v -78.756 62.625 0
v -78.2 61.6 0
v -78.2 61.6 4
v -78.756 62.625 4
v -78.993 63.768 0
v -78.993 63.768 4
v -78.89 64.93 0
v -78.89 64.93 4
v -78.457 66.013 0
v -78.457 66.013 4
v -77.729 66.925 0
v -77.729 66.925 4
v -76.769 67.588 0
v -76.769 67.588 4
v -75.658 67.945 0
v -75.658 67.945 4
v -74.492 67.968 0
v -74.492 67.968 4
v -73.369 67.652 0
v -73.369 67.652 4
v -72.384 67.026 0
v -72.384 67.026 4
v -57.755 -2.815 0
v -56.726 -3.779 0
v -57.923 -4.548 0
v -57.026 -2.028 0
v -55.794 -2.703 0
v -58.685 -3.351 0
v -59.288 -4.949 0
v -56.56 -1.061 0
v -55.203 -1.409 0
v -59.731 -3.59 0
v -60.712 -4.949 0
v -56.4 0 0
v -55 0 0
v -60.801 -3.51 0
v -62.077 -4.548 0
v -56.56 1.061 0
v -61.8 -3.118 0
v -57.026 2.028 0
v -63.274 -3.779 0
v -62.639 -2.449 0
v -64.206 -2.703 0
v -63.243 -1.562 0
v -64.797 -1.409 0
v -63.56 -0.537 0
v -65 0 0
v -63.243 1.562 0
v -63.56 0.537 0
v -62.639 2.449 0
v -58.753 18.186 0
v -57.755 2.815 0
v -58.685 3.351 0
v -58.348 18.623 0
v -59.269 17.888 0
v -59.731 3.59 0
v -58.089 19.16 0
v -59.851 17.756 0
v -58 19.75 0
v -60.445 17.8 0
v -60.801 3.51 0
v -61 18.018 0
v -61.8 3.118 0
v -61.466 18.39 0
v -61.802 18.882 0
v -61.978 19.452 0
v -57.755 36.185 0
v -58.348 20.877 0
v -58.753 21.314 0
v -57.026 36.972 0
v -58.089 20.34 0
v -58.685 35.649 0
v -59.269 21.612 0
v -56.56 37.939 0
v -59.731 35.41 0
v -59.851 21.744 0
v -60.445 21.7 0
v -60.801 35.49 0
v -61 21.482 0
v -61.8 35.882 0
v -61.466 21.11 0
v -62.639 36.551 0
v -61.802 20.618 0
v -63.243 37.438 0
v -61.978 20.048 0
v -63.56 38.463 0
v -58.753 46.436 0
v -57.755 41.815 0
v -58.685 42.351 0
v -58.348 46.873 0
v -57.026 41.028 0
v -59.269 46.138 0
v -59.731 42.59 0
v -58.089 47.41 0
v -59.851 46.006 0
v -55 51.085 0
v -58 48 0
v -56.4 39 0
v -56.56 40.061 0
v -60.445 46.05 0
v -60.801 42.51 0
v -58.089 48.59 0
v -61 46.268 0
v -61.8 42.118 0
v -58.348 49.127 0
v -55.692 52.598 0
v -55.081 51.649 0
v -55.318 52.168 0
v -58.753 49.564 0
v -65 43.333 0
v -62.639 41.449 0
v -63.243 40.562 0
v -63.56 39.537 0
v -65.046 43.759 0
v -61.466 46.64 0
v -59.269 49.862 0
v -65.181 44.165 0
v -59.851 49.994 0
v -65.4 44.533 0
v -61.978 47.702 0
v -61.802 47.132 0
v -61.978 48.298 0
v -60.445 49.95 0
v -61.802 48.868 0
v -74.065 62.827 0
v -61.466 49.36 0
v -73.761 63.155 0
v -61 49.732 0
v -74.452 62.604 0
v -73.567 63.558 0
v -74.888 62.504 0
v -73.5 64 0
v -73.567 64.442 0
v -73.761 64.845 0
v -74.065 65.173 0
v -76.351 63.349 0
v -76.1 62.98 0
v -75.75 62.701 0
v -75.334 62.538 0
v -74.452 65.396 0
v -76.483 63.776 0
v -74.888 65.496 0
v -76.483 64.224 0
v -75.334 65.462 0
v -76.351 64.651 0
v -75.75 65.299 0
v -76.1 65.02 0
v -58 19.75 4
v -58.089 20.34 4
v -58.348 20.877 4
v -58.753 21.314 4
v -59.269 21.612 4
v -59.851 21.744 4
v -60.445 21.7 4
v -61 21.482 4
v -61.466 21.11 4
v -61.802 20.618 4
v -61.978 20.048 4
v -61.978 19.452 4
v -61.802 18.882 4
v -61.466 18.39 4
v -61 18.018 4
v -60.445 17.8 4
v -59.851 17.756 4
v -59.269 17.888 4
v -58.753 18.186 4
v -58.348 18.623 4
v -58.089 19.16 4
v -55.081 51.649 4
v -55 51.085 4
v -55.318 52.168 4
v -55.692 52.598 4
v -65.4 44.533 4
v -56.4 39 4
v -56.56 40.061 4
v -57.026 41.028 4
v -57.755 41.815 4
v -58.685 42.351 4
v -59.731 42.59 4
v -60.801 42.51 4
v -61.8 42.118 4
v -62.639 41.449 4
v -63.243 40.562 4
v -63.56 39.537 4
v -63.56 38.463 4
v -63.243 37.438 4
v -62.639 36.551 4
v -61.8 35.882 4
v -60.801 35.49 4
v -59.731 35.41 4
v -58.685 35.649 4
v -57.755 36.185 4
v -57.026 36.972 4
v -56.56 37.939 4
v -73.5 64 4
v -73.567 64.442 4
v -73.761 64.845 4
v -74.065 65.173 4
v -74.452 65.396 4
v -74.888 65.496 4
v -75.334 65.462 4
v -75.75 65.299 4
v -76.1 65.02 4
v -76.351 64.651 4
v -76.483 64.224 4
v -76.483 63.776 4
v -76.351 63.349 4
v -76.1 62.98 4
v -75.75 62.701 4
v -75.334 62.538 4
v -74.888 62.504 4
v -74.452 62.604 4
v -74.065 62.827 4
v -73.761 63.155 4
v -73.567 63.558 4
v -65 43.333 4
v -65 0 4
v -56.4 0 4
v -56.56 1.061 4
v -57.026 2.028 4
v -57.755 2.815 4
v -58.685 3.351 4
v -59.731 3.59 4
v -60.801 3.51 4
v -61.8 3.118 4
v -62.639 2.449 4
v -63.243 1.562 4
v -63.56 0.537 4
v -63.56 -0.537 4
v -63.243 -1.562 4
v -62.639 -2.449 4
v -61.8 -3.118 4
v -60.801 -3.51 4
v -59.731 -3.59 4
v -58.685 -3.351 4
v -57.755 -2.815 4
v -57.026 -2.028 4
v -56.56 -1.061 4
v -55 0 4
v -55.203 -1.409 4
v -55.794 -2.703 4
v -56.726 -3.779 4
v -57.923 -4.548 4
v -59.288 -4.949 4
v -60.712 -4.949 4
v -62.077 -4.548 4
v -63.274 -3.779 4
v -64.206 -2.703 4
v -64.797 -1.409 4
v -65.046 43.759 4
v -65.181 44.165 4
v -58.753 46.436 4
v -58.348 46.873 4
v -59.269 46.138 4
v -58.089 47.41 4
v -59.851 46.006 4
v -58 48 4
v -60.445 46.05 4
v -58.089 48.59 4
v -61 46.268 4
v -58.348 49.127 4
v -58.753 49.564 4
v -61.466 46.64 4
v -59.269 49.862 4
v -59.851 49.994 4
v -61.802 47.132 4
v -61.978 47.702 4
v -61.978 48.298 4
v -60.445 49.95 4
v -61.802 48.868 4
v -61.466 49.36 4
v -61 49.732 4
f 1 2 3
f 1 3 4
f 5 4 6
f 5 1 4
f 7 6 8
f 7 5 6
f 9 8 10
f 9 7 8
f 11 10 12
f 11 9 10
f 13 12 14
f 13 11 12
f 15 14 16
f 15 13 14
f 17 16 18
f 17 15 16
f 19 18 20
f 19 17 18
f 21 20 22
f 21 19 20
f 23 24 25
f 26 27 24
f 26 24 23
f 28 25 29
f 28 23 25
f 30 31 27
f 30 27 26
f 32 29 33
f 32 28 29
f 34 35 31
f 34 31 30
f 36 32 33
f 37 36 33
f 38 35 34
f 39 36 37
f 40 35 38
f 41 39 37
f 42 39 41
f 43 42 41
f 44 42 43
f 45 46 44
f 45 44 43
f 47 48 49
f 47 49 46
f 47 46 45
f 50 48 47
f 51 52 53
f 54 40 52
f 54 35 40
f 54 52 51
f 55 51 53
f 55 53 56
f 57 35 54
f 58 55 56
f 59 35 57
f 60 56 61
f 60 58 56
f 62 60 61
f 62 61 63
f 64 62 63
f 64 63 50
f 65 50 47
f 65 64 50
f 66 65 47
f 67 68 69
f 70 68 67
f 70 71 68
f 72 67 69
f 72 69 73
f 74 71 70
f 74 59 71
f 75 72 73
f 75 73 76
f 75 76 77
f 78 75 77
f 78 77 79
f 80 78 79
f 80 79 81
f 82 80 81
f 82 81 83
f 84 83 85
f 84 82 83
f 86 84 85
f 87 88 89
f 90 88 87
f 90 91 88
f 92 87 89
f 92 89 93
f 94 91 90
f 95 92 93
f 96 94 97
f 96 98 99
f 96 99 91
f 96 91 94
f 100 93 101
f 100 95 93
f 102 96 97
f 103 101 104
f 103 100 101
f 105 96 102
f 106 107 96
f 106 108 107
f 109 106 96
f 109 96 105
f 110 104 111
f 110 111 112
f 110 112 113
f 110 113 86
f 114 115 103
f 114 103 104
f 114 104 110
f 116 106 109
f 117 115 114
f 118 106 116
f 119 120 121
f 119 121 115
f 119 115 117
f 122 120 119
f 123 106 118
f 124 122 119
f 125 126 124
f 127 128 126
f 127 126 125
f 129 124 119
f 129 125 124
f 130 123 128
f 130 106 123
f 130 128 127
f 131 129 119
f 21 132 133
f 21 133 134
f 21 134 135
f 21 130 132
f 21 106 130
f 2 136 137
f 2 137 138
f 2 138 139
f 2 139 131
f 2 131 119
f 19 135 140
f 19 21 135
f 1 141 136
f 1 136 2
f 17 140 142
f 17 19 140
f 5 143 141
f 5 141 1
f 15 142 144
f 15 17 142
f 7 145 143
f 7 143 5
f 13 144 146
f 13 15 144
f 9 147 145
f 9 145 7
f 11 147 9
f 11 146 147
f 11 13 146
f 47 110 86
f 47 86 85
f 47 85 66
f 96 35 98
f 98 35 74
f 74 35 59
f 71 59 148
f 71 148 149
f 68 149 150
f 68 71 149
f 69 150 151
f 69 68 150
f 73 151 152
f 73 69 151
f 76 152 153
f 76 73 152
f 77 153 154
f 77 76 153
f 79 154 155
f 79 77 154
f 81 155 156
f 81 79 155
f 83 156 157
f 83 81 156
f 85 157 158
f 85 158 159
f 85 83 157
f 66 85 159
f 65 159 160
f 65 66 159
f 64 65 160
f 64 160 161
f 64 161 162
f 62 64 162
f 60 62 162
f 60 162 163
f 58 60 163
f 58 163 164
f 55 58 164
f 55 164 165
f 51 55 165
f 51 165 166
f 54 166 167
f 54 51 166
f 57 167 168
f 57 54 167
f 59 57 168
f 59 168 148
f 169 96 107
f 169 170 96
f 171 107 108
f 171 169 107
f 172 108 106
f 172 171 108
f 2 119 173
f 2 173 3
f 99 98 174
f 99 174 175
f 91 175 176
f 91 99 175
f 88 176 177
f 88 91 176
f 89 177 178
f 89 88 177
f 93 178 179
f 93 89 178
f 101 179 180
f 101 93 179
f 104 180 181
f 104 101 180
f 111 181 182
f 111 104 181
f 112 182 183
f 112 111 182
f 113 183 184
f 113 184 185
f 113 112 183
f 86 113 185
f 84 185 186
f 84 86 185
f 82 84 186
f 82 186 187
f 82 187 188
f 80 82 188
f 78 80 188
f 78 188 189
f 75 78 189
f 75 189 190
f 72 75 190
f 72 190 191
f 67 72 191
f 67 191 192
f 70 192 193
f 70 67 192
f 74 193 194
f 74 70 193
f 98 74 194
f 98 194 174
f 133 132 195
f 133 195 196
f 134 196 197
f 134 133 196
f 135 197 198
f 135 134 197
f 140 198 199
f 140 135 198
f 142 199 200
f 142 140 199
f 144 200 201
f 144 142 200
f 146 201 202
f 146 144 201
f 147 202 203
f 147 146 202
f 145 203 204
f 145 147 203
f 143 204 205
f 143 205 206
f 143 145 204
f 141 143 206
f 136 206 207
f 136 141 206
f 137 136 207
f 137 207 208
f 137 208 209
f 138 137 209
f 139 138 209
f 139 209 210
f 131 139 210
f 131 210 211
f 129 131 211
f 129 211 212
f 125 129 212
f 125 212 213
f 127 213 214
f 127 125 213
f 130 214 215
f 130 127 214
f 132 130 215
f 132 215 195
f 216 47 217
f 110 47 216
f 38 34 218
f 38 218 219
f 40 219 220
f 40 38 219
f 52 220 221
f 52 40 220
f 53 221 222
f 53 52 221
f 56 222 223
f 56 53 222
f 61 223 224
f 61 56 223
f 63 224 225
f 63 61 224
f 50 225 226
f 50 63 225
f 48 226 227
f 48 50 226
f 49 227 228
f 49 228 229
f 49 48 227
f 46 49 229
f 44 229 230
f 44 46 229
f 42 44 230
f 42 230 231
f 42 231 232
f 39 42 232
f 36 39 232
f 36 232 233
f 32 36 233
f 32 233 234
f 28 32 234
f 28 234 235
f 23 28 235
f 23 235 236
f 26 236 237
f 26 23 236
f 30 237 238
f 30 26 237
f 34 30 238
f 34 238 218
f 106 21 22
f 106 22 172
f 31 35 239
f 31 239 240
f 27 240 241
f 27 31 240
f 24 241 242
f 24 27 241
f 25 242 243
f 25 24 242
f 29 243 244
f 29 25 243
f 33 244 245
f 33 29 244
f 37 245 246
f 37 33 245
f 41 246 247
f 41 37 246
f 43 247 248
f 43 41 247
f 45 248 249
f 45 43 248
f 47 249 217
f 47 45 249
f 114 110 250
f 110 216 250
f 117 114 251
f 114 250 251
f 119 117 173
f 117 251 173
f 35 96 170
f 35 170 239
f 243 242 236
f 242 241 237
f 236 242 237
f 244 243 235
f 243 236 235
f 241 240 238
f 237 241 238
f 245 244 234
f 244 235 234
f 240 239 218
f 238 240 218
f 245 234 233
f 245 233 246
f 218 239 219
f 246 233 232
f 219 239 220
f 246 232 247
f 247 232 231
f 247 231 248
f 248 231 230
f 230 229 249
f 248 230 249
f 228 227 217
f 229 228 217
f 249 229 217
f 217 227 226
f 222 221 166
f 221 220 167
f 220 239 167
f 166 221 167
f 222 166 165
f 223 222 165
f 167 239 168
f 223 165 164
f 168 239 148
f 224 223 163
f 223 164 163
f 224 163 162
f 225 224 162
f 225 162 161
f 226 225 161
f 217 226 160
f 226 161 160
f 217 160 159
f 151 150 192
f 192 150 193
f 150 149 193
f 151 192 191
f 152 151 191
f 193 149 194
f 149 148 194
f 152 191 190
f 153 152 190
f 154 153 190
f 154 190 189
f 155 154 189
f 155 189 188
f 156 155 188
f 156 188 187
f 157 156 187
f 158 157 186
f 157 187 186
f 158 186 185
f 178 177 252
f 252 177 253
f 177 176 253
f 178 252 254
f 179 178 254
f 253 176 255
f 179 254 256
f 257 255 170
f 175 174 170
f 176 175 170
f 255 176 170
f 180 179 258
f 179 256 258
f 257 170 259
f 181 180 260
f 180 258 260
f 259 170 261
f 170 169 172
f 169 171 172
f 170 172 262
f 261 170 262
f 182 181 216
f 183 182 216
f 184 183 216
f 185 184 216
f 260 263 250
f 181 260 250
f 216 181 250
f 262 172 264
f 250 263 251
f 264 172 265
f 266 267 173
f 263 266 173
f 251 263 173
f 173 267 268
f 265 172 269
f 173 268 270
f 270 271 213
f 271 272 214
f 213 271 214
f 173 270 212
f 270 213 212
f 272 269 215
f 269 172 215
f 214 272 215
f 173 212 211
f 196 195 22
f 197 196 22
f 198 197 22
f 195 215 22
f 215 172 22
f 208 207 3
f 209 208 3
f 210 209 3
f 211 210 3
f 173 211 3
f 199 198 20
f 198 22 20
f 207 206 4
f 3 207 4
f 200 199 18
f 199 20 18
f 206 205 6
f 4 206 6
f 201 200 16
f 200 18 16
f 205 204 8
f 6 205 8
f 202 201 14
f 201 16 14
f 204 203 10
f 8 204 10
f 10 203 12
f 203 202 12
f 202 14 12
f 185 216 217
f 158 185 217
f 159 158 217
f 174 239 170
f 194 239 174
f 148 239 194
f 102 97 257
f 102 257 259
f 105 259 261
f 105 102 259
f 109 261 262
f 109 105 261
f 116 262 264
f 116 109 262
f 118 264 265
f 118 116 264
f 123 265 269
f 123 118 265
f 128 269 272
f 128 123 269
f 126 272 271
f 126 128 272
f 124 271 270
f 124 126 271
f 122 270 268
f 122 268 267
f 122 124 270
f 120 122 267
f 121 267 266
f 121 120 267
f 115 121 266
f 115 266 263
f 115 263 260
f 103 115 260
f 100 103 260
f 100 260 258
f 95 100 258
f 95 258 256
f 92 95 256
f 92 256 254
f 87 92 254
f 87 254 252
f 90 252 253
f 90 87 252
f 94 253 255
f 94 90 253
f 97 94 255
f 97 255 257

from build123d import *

# Parameters (mm, degrees)
SKETCH_2_R      = 3.6
SKETCH_2_R_2    = 1.5
SKETCH_2_R_3    = 2
EXTRUDE_1_DEPTH = 4
FILLET_1_R      = 2


with BuildPart() as part:
    # 草图2 → 凸台-拉伸1 (new body)
    with BuildSketch(Plane.XY):
        with BuildLine():
            Line((-65, 0), (-65, 44))
            Line((-65, 44), (-78.2, 61.6))
            ThreePointArc((-78.2, 61.6), (-77.728789328, 66.924672427), (-72.384272007, 67.026213321))
            Line((-72.384272007, 67.026213321), (-55, 52))
            Line((-55, 52), (-55, 0))
            ThreePointArc((-55, 0), (-60, -5), (-65, 0))
        make_face()
        with Locations((-60, 39)):
            Circle(SKETCH_2_R, mode=Mode.SUBTRACT)
        with Locations((-60, 0)):
            Circle(SKETCH_2_R, mode=Mode.SUBTRACT)
        with Locations((-75, 64)):
            Circle(SKETCH_2_R_2, mode=Mode.SUBTRACT)
        with Locations((-60, 19.75)):
            Circle(SKETCH_2_R_3, mode=Mode.SUBTRACT)
        with Locations((-60, 48)):
            Circle(SKETCH_2_R_3, mode=Mode.SUBTRACT)
    extrude(amount=EXTRUDE_1_DEPTH)

    # 圆角1
    fillet_1_edges = [part.edges().sort_by_distance(p)[0] for p in [
        (-55, 52, 2),
        (-65, 44, 2),
    ]]
    fillet(fillet_1_edges, radius=FILLET_1_R)


solid = part.part
